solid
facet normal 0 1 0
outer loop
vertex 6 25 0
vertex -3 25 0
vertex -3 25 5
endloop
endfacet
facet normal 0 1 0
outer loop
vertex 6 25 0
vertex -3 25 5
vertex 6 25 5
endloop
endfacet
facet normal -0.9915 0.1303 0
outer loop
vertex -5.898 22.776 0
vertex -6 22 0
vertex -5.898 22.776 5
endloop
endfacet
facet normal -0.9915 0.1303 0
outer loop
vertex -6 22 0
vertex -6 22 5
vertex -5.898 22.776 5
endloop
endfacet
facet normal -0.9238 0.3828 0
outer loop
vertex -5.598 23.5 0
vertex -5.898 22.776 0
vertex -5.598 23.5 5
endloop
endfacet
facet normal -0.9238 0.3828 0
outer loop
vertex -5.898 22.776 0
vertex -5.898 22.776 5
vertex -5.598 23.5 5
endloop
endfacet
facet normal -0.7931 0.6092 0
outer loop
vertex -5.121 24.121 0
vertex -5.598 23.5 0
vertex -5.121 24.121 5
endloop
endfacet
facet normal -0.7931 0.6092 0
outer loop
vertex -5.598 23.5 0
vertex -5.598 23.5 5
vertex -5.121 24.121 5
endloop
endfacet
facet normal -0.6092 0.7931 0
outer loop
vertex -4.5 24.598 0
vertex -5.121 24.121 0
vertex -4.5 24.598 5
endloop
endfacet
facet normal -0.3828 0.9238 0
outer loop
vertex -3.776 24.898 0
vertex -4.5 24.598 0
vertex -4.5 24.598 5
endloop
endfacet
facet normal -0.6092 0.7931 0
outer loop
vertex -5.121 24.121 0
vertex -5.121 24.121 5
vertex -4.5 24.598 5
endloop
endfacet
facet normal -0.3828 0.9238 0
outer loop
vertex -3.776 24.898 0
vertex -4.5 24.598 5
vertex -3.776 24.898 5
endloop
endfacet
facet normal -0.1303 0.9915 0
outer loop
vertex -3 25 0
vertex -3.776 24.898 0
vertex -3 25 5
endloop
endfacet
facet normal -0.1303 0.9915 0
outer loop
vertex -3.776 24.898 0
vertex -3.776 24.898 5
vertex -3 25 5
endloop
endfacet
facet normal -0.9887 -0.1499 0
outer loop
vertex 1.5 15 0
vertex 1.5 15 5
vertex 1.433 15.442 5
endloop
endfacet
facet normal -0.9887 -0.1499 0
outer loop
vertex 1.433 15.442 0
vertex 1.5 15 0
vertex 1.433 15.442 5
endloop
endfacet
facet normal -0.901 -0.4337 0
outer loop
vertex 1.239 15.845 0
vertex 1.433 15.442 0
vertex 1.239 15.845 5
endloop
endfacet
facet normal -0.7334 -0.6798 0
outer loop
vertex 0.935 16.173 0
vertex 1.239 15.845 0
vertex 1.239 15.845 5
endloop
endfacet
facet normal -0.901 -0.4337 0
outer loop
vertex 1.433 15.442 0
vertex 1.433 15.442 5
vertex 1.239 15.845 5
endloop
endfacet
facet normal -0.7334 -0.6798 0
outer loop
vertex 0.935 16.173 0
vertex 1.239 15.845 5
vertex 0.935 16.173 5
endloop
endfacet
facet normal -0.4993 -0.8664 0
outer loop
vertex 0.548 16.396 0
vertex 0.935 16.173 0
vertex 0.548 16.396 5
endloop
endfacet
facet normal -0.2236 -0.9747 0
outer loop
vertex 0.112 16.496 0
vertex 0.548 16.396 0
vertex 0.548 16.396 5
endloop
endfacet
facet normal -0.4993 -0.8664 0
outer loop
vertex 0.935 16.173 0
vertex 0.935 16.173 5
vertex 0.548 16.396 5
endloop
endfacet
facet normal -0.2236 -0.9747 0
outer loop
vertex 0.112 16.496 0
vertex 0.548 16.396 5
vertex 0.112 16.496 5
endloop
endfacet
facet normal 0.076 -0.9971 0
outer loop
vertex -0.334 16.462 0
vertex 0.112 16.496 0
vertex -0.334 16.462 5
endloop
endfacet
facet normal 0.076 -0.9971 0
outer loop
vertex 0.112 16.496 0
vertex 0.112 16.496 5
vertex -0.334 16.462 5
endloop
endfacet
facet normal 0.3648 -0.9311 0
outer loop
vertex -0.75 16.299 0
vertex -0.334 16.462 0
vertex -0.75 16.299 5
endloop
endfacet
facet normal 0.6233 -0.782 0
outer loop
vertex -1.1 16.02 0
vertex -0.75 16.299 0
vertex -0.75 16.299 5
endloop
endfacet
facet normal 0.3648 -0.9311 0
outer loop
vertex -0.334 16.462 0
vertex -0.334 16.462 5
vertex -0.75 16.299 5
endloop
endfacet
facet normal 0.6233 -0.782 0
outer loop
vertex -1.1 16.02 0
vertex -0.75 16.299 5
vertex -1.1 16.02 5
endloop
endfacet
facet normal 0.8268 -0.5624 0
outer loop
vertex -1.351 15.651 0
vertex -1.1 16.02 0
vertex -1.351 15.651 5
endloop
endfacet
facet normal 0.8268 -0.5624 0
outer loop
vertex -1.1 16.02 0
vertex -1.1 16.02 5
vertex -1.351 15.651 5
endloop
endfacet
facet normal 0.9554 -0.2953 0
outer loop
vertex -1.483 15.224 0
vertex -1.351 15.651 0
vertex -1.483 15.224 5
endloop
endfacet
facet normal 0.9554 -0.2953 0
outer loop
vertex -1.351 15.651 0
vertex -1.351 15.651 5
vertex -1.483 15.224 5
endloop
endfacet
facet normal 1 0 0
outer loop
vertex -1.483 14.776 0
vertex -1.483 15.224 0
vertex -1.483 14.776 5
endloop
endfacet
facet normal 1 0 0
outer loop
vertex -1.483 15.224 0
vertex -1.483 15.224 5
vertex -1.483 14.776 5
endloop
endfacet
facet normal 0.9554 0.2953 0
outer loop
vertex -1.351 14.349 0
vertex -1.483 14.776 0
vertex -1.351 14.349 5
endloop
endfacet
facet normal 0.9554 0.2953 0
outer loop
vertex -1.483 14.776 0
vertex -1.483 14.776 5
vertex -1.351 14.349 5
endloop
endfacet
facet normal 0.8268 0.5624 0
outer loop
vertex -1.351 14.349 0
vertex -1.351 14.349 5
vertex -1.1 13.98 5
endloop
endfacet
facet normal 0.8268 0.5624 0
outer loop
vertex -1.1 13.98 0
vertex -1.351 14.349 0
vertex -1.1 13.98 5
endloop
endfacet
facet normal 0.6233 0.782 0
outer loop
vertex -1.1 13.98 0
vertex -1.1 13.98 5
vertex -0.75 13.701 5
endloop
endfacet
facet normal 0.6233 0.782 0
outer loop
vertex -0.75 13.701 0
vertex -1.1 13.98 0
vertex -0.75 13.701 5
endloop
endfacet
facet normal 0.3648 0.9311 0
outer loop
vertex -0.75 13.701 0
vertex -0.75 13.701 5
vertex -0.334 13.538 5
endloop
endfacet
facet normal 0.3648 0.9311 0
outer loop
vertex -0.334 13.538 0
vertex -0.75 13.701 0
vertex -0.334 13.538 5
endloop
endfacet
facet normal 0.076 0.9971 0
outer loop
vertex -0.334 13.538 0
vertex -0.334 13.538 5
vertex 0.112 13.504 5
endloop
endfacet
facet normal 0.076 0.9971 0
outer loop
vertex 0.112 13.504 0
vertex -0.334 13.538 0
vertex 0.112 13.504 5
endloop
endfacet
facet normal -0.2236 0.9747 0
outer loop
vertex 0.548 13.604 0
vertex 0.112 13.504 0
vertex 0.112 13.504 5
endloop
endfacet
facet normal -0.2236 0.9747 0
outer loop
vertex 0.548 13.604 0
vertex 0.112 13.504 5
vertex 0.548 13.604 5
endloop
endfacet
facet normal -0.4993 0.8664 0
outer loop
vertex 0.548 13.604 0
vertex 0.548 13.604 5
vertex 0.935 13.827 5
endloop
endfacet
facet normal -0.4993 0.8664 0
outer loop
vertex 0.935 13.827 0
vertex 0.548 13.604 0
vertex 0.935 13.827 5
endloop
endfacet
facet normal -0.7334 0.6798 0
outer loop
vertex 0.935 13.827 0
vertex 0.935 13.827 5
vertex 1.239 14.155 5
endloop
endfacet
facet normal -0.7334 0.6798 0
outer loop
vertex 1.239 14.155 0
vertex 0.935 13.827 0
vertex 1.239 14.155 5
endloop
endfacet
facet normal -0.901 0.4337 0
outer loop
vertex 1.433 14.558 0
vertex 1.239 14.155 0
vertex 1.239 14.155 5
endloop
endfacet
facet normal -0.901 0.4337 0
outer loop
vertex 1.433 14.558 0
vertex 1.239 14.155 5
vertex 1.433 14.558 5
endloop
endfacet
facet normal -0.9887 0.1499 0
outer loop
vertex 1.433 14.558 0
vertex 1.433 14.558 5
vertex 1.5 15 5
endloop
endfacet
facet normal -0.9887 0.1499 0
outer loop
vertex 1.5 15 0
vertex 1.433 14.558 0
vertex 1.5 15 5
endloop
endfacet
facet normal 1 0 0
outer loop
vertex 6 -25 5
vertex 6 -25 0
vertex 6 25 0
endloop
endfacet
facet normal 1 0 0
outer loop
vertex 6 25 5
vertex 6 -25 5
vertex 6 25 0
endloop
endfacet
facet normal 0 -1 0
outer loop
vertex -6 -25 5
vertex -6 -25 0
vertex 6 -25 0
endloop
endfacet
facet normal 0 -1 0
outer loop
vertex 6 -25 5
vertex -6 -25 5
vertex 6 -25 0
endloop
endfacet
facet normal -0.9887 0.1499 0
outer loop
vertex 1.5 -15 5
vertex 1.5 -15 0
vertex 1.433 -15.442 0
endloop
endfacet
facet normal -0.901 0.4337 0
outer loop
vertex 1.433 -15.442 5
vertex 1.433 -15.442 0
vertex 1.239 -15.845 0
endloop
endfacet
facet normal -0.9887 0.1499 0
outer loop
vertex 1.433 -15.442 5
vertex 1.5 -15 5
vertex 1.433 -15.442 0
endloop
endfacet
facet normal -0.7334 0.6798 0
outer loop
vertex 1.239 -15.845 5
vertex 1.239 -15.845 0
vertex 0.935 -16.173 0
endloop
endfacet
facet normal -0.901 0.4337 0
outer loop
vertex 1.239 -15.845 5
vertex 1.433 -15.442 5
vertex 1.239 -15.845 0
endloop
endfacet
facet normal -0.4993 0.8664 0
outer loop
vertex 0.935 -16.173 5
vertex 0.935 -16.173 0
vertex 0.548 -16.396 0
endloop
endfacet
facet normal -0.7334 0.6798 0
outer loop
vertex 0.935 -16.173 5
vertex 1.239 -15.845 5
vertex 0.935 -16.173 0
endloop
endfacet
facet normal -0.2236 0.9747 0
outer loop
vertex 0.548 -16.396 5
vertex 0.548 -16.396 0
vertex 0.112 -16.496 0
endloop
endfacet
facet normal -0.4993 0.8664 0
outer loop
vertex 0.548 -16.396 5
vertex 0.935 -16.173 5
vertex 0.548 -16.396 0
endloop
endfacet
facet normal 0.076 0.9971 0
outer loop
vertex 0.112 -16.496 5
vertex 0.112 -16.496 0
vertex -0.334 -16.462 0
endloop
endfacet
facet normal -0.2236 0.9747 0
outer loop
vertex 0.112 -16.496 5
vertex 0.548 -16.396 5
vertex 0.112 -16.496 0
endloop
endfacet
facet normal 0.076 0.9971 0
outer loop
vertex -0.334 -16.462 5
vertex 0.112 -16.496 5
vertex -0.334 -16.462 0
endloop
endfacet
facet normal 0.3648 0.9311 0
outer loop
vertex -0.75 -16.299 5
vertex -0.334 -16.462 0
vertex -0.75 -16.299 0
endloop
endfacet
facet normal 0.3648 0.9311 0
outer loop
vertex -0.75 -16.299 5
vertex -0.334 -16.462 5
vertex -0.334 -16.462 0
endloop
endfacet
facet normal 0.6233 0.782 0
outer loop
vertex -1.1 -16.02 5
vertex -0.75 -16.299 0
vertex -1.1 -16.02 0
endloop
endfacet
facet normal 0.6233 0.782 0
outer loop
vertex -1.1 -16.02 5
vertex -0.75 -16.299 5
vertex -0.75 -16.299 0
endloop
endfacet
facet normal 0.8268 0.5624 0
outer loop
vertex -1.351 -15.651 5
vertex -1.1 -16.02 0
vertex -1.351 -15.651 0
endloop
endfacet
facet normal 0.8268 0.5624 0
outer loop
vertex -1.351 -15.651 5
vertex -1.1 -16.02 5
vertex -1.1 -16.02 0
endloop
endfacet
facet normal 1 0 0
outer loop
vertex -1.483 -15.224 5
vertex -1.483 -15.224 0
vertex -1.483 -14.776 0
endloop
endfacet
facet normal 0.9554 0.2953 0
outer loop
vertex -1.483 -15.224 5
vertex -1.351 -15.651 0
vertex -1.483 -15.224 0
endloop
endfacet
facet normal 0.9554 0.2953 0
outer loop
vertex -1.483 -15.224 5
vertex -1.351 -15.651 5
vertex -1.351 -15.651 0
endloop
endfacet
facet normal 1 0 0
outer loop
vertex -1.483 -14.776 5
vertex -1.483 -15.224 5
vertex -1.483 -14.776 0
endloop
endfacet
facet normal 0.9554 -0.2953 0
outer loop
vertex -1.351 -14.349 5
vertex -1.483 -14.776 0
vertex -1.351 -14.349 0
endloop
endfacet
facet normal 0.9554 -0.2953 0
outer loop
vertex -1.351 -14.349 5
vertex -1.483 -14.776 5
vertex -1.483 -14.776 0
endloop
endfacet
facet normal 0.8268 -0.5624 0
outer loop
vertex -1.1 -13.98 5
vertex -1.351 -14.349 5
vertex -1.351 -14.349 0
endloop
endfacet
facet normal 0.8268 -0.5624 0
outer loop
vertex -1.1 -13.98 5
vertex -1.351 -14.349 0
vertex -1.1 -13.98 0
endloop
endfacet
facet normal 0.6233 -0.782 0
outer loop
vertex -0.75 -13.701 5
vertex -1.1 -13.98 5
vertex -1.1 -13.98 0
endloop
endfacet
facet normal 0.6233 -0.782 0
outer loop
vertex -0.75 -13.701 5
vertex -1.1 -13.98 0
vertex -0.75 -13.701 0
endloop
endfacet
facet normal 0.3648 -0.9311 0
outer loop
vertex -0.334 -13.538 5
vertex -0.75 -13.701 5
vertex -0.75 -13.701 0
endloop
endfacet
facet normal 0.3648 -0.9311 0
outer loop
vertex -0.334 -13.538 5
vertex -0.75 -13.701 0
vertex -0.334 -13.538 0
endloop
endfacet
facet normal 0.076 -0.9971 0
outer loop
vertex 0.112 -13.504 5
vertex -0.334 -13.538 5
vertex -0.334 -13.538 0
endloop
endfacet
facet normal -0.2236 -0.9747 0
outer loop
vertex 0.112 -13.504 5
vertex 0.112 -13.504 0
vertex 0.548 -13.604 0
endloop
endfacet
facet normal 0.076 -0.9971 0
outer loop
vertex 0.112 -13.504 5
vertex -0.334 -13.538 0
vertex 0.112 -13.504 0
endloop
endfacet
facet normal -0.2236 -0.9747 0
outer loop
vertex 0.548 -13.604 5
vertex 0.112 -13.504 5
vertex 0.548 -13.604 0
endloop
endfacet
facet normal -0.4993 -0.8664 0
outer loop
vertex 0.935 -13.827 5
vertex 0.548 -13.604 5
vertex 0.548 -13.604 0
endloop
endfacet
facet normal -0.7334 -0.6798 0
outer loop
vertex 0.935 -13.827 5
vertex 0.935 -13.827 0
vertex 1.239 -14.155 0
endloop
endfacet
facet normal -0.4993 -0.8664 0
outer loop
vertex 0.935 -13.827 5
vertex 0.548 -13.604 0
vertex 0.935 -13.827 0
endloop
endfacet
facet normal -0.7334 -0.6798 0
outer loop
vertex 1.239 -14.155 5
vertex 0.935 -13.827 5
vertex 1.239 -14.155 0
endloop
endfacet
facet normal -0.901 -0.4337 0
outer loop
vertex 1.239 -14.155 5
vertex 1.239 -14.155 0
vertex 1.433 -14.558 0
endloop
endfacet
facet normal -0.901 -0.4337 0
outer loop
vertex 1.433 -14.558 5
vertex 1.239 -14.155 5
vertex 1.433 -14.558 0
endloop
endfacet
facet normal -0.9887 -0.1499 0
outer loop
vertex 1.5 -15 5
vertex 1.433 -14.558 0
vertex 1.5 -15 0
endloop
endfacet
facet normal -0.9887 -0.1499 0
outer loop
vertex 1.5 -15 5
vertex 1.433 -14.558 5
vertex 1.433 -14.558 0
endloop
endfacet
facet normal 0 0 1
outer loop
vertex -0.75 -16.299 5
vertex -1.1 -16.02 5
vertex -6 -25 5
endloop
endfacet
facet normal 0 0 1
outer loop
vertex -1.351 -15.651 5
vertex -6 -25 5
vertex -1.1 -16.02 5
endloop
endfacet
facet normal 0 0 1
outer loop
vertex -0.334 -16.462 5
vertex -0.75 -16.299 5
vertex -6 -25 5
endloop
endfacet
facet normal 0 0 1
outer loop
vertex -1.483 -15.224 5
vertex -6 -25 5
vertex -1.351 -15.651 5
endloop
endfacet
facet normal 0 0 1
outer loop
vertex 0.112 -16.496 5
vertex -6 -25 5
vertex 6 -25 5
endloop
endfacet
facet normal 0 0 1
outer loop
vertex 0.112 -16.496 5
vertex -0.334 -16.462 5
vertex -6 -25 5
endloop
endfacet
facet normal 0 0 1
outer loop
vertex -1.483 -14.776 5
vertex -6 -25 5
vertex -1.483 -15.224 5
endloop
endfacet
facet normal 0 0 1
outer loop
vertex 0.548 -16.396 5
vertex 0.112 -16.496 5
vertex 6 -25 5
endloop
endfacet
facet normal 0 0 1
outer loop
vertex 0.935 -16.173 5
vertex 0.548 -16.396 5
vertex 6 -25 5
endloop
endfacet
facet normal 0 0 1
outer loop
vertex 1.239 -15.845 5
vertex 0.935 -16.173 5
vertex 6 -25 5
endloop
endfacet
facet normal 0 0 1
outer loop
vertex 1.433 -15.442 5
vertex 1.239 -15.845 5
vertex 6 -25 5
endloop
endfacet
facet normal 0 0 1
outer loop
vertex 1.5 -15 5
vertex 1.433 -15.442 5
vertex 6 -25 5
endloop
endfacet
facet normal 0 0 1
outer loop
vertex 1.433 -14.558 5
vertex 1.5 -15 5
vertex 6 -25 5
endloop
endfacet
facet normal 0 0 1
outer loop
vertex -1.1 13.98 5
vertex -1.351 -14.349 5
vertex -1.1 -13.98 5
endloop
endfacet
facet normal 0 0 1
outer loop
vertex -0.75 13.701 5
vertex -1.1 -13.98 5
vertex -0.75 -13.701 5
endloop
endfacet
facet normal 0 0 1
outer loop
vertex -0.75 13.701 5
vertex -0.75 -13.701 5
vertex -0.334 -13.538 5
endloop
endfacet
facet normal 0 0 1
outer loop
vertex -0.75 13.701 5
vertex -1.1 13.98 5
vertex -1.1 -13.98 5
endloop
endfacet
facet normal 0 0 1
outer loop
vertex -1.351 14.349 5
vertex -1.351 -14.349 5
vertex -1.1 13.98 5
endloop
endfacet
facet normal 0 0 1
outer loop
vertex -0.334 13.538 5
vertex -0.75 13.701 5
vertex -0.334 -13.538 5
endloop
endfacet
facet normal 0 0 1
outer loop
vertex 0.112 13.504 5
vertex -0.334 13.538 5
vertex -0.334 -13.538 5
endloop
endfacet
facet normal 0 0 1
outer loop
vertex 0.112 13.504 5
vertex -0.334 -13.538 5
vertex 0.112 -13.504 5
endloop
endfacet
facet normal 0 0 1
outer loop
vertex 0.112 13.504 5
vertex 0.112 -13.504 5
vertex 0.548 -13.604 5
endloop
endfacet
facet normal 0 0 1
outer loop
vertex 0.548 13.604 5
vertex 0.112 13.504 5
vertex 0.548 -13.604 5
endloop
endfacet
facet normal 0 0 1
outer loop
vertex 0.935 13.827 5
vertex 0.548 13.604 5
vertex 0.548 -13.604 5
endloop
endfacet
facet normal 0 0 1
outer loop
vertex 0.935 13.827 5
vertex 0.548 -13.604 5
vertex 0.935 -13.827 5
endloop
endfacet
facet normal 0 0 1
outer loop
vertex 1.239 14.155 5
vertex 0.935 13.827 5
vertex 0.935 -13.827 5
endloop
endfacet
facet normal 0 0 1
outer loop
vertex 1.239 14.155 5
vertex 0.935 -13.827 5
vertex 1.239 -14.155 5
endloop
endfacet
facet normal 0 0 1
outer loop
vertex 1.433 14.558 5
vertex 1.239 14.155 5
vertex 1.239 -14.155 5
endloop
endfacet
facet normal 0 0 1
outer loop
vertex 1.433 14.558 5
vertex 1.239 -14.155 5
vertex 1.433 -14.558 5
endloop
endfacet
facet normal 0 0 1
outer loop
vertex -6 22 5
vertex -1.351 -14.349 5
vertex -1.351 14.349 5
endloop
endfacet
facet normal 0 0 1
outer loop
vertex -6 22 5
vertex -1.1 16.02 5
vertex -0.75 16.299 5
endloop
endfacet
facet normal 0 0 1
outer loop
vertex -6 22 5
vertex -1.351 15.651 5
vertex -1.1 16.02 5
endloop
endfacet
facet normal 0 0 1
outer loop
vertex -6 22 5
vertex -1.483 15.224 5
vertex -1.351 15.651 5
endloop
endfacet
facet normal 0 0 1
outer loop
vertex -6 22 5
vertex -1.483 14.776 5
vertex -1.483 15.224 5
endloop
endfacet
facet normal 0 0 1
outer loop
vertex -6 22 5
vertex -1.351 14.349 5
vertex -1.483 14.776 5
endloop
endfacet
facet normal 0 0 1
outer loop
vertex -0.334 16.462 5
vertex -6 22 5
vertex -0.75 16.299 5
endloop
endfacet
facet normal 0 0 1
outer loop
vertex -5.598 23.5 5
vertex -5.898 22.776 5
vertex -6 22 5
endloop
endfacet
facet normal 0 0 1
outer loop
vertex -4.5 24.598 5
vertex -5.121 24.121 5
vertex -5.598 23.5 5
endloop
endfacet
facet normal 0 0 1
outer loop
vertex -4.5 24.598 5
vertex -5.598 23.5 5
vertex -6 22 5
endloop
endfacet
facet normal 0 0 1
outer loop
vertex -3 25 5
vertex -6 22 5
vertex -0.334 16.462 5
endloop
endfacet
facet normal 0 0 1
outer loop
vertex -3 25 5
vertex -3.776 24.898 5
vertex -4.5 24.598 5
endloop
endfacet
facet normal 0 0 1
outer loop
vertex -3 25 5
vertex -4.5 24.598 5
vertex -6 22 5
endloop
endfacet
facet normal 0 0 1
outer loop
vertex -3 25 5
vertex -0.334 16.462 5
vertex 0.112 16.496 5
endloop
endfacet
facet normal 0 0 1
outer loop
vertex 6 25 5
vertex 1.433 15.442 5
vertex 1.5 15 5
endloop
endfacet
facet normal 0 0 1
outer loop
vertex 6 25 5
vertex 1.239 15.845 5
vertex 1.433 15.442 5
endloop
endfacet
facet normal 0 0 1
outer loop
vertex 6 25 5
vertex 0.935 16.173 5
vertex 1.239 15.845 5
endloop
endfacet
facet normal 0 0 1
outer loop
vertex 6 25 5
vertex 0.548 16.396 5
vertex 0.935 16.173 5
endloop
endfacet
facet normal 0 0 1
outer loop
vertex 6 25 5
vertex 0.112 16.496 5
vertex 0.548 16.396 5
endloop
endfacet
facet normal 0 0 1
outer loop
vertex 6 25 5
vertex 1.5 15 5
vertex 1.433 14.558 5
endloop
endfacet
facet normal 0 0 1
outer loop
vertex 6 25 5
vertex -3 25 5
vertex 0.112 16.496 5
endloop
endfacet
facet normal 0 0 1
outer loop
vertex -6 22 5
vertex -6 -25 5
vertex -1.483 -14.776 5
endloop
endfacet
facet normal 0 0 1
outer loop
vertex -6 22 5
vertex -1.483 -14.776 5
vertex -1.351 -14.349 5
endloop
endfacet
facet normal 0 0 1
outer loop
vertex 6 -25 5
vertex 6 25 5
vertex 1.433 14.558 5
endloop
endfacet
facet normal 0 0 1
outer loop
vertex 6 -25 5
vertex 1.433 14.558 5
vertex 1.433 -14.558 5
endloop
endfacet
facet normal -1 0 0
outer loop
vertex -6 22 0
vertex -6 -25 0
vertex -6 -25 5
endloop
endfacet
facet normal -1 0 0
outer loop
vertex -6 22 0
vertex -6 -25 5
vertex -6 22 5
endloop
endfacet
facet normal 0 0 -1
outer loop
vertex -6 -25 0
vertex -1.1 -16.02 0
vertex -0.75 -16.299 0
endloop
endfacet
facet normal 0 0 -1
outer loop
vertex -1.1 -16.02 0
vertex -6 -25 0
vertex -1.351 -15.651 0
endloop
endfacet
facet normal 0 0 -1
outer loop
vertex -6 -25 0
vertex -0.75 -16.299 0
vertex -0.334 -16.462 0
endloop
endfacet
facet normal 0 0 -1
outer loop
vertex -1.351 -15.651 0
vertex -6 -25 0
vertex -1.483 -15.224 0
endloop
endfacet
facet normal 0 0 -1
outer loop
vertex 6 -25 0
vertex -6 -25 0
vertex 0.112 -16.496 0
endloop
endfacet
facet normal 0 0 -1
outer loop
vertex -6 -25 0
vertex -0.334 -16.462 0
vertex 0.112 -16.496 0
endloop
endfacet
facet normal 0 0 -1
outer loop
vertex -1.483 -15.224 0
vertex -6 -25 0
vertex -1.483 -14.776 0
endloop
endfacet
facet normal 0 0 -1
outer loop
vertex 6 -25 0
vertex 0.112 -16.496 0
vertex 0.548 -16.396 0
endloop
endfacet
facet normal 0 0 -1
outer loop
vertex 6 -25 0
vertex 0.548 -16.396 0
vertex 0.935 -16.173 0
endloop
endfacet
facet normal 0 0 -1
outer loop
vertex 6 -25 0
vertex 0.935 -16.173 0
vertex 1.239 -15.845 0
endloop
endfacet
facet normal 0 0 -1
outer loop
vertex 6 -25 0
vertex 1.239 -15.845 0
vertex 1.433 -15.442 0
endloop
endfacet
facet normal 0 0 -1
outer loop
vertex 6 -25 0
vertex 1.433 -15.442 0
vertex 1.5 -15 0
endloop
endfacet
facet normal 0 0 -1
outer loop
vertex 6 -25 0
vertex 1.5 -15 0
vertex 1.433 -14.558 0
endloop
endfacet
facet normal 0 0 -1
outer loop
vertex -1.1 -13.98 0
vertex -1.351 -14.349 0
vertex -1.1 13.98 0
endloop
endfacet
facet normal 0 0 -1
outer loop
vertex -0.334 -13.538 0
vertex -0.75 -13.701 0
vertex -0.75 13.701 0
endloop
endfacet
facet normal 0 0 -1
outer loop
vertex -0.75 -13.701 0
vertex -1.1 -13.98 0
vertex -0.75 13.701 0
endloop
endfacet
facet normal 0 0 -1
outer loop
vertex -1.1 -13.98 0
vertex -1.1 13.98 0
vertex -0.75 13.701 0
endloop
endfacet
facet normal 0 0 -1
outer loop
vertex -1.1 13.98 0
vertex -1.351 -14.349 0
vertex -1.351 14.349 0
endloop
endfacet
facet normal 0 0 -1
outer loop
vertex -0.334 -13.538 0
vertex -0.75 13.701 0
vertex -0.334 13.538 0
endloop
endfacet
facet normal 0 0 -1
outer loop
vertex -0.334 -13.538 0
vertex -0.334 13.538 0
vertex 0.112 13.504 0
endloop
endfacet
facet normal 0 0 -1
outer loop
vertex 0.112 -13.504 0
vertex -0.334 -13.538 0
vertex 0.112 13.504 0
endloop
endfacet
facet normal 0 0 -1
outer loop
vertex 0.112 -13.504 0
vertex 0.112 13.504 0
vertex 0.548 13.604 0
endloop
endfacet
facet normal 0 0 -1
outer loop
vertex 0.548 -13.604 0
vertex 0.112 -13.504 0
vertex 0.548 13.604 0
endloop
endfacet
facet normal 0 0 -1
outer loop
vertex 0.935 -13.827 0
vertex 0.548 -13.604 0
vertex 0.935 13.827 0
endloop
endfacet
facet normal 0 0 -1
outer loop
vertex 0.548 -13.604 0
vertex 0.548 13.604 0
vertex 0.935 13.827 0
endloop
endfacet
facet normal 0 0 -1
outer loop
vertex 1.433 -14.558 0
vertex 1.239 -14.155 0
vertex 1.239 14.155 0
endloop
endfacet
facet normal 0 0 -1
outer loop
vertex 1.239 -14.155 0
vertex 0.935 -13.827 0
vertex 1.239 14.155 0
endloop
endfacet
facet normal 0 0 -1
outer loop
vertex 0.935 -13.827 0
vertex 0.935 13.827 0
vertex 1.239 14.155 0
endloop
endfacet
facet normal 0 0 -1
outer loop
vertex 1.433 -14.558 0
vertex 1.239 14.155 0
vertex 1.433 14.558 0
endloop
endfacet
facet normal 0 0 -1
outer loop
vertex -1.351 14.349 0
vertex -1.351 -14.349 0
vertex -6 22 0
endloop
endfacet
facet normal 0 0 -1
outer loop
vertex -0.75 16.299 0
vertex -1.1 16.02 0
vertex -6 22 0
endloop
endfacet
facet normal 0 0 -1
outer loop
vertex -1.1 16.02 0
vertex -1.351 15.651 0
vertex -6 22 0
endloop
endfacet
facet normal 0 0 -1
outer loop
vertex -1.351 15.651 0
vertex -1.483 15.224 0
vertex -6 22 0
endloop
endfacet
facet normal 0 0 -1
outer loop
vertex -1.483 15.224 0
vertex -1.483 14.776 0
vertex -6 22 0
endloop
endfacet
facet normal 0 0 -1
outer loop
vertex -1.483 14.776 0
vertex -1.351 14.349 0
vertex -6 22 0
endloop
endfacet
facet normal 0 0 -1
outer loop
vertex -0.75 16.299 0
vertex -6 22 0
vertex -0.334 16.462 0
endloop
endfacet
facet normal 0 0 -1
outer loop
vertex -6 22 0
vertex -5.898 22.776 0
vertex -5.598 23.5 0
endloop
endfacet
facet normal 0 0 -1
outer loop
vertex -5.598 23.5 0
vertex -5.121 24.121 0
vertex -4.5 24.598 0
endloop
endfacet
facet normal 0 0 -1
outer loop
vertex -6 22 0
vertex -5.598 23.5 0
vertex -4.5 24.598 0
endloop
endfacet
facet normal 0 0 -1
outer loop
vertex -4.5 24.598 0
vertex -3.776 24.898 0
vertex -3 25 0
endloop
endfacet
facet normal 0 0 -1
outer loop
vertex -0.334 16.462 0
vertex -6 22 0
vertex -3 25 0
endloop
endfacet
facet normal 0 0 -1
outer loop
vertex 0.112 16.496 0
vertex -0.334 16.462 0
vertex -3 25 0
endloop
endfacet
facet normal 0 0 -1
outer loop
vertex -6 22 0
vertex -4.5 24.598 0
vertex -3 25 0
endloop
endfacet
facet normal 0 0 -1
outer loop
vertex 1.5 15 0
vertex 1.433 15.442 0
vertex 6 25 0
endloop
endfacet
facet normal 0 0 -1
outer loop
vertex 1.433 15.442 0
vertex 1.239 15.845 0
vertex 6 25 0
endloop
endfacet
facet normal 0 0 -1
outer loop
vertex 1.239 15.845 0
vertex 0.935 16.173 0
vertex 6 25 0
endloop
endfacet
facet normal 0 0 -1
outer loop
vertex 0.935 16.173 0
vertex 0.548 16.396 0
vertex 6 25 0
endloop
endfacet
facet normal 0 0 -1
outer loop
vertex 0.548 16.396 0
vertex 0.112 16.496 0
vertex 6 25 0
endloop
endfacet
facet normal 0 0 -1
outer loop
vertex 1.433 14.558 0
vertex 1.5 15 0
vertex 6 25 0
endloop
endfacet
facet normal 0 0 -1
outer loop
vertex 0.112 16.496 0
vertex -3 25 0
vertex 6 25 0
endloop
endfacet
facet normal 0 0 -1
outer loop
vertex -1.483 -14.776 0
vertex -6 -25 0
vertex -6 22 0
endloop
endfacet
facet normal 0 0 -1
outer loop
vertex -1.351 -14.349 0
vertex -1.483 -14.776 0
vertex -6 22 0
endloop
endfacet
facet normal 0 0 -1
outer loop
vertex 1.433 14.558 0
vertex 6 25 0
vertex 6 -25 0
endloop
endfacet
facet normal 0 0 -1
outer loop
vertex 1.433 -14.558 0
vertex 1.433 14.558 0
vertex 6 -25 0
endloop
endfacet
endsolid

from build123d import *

# Parameters (mm, degrees)
SKETCH_1_W          = 12
SKETCH_1_H          = 50
EXTRUDE_1_DEPTH     = 5
SKETCH_2_R          = 1.5
CUT_EXTRUDE_1_DEPTH = 27.191601707
FILLET_2_R          = 3


with BuildPart() as part:
    # 草图1 → 凸台-拉伸1 (new body)
    with BuildSketch(Plane.XY):
        Rectangle(SKETCH_1_W, SKETCH_1_H)
    extrude(amount=EXTRUDE_1_DEPTH)

    # 草图2 → 切除-拉伸1 (cut, through all)
    with BuildSketch(Plane.XY.offset(5)):
        with Locations((0, 15)):
            Circle(SKETCH_2_R)
    cut_extrude_1 = extrude(amount=-CUT_EXTRUDE_1_DEPTH, mode=Mode.SUBTRACT)

    # 镜向1: 切除-拉伸1 across plane
    add(cut_extrude_1.mirror(Plane.ZX), mode=Mode.SUBTRACT)

    # 圆角2
    fillet_2_edges = [part.edges().sort_by_distance(p)[0] for p in [
        (-6, 25, 2.5),
    ]]
    fillet(fillet_2_edges, radius=FILLET_2_R)


solid = part.part
